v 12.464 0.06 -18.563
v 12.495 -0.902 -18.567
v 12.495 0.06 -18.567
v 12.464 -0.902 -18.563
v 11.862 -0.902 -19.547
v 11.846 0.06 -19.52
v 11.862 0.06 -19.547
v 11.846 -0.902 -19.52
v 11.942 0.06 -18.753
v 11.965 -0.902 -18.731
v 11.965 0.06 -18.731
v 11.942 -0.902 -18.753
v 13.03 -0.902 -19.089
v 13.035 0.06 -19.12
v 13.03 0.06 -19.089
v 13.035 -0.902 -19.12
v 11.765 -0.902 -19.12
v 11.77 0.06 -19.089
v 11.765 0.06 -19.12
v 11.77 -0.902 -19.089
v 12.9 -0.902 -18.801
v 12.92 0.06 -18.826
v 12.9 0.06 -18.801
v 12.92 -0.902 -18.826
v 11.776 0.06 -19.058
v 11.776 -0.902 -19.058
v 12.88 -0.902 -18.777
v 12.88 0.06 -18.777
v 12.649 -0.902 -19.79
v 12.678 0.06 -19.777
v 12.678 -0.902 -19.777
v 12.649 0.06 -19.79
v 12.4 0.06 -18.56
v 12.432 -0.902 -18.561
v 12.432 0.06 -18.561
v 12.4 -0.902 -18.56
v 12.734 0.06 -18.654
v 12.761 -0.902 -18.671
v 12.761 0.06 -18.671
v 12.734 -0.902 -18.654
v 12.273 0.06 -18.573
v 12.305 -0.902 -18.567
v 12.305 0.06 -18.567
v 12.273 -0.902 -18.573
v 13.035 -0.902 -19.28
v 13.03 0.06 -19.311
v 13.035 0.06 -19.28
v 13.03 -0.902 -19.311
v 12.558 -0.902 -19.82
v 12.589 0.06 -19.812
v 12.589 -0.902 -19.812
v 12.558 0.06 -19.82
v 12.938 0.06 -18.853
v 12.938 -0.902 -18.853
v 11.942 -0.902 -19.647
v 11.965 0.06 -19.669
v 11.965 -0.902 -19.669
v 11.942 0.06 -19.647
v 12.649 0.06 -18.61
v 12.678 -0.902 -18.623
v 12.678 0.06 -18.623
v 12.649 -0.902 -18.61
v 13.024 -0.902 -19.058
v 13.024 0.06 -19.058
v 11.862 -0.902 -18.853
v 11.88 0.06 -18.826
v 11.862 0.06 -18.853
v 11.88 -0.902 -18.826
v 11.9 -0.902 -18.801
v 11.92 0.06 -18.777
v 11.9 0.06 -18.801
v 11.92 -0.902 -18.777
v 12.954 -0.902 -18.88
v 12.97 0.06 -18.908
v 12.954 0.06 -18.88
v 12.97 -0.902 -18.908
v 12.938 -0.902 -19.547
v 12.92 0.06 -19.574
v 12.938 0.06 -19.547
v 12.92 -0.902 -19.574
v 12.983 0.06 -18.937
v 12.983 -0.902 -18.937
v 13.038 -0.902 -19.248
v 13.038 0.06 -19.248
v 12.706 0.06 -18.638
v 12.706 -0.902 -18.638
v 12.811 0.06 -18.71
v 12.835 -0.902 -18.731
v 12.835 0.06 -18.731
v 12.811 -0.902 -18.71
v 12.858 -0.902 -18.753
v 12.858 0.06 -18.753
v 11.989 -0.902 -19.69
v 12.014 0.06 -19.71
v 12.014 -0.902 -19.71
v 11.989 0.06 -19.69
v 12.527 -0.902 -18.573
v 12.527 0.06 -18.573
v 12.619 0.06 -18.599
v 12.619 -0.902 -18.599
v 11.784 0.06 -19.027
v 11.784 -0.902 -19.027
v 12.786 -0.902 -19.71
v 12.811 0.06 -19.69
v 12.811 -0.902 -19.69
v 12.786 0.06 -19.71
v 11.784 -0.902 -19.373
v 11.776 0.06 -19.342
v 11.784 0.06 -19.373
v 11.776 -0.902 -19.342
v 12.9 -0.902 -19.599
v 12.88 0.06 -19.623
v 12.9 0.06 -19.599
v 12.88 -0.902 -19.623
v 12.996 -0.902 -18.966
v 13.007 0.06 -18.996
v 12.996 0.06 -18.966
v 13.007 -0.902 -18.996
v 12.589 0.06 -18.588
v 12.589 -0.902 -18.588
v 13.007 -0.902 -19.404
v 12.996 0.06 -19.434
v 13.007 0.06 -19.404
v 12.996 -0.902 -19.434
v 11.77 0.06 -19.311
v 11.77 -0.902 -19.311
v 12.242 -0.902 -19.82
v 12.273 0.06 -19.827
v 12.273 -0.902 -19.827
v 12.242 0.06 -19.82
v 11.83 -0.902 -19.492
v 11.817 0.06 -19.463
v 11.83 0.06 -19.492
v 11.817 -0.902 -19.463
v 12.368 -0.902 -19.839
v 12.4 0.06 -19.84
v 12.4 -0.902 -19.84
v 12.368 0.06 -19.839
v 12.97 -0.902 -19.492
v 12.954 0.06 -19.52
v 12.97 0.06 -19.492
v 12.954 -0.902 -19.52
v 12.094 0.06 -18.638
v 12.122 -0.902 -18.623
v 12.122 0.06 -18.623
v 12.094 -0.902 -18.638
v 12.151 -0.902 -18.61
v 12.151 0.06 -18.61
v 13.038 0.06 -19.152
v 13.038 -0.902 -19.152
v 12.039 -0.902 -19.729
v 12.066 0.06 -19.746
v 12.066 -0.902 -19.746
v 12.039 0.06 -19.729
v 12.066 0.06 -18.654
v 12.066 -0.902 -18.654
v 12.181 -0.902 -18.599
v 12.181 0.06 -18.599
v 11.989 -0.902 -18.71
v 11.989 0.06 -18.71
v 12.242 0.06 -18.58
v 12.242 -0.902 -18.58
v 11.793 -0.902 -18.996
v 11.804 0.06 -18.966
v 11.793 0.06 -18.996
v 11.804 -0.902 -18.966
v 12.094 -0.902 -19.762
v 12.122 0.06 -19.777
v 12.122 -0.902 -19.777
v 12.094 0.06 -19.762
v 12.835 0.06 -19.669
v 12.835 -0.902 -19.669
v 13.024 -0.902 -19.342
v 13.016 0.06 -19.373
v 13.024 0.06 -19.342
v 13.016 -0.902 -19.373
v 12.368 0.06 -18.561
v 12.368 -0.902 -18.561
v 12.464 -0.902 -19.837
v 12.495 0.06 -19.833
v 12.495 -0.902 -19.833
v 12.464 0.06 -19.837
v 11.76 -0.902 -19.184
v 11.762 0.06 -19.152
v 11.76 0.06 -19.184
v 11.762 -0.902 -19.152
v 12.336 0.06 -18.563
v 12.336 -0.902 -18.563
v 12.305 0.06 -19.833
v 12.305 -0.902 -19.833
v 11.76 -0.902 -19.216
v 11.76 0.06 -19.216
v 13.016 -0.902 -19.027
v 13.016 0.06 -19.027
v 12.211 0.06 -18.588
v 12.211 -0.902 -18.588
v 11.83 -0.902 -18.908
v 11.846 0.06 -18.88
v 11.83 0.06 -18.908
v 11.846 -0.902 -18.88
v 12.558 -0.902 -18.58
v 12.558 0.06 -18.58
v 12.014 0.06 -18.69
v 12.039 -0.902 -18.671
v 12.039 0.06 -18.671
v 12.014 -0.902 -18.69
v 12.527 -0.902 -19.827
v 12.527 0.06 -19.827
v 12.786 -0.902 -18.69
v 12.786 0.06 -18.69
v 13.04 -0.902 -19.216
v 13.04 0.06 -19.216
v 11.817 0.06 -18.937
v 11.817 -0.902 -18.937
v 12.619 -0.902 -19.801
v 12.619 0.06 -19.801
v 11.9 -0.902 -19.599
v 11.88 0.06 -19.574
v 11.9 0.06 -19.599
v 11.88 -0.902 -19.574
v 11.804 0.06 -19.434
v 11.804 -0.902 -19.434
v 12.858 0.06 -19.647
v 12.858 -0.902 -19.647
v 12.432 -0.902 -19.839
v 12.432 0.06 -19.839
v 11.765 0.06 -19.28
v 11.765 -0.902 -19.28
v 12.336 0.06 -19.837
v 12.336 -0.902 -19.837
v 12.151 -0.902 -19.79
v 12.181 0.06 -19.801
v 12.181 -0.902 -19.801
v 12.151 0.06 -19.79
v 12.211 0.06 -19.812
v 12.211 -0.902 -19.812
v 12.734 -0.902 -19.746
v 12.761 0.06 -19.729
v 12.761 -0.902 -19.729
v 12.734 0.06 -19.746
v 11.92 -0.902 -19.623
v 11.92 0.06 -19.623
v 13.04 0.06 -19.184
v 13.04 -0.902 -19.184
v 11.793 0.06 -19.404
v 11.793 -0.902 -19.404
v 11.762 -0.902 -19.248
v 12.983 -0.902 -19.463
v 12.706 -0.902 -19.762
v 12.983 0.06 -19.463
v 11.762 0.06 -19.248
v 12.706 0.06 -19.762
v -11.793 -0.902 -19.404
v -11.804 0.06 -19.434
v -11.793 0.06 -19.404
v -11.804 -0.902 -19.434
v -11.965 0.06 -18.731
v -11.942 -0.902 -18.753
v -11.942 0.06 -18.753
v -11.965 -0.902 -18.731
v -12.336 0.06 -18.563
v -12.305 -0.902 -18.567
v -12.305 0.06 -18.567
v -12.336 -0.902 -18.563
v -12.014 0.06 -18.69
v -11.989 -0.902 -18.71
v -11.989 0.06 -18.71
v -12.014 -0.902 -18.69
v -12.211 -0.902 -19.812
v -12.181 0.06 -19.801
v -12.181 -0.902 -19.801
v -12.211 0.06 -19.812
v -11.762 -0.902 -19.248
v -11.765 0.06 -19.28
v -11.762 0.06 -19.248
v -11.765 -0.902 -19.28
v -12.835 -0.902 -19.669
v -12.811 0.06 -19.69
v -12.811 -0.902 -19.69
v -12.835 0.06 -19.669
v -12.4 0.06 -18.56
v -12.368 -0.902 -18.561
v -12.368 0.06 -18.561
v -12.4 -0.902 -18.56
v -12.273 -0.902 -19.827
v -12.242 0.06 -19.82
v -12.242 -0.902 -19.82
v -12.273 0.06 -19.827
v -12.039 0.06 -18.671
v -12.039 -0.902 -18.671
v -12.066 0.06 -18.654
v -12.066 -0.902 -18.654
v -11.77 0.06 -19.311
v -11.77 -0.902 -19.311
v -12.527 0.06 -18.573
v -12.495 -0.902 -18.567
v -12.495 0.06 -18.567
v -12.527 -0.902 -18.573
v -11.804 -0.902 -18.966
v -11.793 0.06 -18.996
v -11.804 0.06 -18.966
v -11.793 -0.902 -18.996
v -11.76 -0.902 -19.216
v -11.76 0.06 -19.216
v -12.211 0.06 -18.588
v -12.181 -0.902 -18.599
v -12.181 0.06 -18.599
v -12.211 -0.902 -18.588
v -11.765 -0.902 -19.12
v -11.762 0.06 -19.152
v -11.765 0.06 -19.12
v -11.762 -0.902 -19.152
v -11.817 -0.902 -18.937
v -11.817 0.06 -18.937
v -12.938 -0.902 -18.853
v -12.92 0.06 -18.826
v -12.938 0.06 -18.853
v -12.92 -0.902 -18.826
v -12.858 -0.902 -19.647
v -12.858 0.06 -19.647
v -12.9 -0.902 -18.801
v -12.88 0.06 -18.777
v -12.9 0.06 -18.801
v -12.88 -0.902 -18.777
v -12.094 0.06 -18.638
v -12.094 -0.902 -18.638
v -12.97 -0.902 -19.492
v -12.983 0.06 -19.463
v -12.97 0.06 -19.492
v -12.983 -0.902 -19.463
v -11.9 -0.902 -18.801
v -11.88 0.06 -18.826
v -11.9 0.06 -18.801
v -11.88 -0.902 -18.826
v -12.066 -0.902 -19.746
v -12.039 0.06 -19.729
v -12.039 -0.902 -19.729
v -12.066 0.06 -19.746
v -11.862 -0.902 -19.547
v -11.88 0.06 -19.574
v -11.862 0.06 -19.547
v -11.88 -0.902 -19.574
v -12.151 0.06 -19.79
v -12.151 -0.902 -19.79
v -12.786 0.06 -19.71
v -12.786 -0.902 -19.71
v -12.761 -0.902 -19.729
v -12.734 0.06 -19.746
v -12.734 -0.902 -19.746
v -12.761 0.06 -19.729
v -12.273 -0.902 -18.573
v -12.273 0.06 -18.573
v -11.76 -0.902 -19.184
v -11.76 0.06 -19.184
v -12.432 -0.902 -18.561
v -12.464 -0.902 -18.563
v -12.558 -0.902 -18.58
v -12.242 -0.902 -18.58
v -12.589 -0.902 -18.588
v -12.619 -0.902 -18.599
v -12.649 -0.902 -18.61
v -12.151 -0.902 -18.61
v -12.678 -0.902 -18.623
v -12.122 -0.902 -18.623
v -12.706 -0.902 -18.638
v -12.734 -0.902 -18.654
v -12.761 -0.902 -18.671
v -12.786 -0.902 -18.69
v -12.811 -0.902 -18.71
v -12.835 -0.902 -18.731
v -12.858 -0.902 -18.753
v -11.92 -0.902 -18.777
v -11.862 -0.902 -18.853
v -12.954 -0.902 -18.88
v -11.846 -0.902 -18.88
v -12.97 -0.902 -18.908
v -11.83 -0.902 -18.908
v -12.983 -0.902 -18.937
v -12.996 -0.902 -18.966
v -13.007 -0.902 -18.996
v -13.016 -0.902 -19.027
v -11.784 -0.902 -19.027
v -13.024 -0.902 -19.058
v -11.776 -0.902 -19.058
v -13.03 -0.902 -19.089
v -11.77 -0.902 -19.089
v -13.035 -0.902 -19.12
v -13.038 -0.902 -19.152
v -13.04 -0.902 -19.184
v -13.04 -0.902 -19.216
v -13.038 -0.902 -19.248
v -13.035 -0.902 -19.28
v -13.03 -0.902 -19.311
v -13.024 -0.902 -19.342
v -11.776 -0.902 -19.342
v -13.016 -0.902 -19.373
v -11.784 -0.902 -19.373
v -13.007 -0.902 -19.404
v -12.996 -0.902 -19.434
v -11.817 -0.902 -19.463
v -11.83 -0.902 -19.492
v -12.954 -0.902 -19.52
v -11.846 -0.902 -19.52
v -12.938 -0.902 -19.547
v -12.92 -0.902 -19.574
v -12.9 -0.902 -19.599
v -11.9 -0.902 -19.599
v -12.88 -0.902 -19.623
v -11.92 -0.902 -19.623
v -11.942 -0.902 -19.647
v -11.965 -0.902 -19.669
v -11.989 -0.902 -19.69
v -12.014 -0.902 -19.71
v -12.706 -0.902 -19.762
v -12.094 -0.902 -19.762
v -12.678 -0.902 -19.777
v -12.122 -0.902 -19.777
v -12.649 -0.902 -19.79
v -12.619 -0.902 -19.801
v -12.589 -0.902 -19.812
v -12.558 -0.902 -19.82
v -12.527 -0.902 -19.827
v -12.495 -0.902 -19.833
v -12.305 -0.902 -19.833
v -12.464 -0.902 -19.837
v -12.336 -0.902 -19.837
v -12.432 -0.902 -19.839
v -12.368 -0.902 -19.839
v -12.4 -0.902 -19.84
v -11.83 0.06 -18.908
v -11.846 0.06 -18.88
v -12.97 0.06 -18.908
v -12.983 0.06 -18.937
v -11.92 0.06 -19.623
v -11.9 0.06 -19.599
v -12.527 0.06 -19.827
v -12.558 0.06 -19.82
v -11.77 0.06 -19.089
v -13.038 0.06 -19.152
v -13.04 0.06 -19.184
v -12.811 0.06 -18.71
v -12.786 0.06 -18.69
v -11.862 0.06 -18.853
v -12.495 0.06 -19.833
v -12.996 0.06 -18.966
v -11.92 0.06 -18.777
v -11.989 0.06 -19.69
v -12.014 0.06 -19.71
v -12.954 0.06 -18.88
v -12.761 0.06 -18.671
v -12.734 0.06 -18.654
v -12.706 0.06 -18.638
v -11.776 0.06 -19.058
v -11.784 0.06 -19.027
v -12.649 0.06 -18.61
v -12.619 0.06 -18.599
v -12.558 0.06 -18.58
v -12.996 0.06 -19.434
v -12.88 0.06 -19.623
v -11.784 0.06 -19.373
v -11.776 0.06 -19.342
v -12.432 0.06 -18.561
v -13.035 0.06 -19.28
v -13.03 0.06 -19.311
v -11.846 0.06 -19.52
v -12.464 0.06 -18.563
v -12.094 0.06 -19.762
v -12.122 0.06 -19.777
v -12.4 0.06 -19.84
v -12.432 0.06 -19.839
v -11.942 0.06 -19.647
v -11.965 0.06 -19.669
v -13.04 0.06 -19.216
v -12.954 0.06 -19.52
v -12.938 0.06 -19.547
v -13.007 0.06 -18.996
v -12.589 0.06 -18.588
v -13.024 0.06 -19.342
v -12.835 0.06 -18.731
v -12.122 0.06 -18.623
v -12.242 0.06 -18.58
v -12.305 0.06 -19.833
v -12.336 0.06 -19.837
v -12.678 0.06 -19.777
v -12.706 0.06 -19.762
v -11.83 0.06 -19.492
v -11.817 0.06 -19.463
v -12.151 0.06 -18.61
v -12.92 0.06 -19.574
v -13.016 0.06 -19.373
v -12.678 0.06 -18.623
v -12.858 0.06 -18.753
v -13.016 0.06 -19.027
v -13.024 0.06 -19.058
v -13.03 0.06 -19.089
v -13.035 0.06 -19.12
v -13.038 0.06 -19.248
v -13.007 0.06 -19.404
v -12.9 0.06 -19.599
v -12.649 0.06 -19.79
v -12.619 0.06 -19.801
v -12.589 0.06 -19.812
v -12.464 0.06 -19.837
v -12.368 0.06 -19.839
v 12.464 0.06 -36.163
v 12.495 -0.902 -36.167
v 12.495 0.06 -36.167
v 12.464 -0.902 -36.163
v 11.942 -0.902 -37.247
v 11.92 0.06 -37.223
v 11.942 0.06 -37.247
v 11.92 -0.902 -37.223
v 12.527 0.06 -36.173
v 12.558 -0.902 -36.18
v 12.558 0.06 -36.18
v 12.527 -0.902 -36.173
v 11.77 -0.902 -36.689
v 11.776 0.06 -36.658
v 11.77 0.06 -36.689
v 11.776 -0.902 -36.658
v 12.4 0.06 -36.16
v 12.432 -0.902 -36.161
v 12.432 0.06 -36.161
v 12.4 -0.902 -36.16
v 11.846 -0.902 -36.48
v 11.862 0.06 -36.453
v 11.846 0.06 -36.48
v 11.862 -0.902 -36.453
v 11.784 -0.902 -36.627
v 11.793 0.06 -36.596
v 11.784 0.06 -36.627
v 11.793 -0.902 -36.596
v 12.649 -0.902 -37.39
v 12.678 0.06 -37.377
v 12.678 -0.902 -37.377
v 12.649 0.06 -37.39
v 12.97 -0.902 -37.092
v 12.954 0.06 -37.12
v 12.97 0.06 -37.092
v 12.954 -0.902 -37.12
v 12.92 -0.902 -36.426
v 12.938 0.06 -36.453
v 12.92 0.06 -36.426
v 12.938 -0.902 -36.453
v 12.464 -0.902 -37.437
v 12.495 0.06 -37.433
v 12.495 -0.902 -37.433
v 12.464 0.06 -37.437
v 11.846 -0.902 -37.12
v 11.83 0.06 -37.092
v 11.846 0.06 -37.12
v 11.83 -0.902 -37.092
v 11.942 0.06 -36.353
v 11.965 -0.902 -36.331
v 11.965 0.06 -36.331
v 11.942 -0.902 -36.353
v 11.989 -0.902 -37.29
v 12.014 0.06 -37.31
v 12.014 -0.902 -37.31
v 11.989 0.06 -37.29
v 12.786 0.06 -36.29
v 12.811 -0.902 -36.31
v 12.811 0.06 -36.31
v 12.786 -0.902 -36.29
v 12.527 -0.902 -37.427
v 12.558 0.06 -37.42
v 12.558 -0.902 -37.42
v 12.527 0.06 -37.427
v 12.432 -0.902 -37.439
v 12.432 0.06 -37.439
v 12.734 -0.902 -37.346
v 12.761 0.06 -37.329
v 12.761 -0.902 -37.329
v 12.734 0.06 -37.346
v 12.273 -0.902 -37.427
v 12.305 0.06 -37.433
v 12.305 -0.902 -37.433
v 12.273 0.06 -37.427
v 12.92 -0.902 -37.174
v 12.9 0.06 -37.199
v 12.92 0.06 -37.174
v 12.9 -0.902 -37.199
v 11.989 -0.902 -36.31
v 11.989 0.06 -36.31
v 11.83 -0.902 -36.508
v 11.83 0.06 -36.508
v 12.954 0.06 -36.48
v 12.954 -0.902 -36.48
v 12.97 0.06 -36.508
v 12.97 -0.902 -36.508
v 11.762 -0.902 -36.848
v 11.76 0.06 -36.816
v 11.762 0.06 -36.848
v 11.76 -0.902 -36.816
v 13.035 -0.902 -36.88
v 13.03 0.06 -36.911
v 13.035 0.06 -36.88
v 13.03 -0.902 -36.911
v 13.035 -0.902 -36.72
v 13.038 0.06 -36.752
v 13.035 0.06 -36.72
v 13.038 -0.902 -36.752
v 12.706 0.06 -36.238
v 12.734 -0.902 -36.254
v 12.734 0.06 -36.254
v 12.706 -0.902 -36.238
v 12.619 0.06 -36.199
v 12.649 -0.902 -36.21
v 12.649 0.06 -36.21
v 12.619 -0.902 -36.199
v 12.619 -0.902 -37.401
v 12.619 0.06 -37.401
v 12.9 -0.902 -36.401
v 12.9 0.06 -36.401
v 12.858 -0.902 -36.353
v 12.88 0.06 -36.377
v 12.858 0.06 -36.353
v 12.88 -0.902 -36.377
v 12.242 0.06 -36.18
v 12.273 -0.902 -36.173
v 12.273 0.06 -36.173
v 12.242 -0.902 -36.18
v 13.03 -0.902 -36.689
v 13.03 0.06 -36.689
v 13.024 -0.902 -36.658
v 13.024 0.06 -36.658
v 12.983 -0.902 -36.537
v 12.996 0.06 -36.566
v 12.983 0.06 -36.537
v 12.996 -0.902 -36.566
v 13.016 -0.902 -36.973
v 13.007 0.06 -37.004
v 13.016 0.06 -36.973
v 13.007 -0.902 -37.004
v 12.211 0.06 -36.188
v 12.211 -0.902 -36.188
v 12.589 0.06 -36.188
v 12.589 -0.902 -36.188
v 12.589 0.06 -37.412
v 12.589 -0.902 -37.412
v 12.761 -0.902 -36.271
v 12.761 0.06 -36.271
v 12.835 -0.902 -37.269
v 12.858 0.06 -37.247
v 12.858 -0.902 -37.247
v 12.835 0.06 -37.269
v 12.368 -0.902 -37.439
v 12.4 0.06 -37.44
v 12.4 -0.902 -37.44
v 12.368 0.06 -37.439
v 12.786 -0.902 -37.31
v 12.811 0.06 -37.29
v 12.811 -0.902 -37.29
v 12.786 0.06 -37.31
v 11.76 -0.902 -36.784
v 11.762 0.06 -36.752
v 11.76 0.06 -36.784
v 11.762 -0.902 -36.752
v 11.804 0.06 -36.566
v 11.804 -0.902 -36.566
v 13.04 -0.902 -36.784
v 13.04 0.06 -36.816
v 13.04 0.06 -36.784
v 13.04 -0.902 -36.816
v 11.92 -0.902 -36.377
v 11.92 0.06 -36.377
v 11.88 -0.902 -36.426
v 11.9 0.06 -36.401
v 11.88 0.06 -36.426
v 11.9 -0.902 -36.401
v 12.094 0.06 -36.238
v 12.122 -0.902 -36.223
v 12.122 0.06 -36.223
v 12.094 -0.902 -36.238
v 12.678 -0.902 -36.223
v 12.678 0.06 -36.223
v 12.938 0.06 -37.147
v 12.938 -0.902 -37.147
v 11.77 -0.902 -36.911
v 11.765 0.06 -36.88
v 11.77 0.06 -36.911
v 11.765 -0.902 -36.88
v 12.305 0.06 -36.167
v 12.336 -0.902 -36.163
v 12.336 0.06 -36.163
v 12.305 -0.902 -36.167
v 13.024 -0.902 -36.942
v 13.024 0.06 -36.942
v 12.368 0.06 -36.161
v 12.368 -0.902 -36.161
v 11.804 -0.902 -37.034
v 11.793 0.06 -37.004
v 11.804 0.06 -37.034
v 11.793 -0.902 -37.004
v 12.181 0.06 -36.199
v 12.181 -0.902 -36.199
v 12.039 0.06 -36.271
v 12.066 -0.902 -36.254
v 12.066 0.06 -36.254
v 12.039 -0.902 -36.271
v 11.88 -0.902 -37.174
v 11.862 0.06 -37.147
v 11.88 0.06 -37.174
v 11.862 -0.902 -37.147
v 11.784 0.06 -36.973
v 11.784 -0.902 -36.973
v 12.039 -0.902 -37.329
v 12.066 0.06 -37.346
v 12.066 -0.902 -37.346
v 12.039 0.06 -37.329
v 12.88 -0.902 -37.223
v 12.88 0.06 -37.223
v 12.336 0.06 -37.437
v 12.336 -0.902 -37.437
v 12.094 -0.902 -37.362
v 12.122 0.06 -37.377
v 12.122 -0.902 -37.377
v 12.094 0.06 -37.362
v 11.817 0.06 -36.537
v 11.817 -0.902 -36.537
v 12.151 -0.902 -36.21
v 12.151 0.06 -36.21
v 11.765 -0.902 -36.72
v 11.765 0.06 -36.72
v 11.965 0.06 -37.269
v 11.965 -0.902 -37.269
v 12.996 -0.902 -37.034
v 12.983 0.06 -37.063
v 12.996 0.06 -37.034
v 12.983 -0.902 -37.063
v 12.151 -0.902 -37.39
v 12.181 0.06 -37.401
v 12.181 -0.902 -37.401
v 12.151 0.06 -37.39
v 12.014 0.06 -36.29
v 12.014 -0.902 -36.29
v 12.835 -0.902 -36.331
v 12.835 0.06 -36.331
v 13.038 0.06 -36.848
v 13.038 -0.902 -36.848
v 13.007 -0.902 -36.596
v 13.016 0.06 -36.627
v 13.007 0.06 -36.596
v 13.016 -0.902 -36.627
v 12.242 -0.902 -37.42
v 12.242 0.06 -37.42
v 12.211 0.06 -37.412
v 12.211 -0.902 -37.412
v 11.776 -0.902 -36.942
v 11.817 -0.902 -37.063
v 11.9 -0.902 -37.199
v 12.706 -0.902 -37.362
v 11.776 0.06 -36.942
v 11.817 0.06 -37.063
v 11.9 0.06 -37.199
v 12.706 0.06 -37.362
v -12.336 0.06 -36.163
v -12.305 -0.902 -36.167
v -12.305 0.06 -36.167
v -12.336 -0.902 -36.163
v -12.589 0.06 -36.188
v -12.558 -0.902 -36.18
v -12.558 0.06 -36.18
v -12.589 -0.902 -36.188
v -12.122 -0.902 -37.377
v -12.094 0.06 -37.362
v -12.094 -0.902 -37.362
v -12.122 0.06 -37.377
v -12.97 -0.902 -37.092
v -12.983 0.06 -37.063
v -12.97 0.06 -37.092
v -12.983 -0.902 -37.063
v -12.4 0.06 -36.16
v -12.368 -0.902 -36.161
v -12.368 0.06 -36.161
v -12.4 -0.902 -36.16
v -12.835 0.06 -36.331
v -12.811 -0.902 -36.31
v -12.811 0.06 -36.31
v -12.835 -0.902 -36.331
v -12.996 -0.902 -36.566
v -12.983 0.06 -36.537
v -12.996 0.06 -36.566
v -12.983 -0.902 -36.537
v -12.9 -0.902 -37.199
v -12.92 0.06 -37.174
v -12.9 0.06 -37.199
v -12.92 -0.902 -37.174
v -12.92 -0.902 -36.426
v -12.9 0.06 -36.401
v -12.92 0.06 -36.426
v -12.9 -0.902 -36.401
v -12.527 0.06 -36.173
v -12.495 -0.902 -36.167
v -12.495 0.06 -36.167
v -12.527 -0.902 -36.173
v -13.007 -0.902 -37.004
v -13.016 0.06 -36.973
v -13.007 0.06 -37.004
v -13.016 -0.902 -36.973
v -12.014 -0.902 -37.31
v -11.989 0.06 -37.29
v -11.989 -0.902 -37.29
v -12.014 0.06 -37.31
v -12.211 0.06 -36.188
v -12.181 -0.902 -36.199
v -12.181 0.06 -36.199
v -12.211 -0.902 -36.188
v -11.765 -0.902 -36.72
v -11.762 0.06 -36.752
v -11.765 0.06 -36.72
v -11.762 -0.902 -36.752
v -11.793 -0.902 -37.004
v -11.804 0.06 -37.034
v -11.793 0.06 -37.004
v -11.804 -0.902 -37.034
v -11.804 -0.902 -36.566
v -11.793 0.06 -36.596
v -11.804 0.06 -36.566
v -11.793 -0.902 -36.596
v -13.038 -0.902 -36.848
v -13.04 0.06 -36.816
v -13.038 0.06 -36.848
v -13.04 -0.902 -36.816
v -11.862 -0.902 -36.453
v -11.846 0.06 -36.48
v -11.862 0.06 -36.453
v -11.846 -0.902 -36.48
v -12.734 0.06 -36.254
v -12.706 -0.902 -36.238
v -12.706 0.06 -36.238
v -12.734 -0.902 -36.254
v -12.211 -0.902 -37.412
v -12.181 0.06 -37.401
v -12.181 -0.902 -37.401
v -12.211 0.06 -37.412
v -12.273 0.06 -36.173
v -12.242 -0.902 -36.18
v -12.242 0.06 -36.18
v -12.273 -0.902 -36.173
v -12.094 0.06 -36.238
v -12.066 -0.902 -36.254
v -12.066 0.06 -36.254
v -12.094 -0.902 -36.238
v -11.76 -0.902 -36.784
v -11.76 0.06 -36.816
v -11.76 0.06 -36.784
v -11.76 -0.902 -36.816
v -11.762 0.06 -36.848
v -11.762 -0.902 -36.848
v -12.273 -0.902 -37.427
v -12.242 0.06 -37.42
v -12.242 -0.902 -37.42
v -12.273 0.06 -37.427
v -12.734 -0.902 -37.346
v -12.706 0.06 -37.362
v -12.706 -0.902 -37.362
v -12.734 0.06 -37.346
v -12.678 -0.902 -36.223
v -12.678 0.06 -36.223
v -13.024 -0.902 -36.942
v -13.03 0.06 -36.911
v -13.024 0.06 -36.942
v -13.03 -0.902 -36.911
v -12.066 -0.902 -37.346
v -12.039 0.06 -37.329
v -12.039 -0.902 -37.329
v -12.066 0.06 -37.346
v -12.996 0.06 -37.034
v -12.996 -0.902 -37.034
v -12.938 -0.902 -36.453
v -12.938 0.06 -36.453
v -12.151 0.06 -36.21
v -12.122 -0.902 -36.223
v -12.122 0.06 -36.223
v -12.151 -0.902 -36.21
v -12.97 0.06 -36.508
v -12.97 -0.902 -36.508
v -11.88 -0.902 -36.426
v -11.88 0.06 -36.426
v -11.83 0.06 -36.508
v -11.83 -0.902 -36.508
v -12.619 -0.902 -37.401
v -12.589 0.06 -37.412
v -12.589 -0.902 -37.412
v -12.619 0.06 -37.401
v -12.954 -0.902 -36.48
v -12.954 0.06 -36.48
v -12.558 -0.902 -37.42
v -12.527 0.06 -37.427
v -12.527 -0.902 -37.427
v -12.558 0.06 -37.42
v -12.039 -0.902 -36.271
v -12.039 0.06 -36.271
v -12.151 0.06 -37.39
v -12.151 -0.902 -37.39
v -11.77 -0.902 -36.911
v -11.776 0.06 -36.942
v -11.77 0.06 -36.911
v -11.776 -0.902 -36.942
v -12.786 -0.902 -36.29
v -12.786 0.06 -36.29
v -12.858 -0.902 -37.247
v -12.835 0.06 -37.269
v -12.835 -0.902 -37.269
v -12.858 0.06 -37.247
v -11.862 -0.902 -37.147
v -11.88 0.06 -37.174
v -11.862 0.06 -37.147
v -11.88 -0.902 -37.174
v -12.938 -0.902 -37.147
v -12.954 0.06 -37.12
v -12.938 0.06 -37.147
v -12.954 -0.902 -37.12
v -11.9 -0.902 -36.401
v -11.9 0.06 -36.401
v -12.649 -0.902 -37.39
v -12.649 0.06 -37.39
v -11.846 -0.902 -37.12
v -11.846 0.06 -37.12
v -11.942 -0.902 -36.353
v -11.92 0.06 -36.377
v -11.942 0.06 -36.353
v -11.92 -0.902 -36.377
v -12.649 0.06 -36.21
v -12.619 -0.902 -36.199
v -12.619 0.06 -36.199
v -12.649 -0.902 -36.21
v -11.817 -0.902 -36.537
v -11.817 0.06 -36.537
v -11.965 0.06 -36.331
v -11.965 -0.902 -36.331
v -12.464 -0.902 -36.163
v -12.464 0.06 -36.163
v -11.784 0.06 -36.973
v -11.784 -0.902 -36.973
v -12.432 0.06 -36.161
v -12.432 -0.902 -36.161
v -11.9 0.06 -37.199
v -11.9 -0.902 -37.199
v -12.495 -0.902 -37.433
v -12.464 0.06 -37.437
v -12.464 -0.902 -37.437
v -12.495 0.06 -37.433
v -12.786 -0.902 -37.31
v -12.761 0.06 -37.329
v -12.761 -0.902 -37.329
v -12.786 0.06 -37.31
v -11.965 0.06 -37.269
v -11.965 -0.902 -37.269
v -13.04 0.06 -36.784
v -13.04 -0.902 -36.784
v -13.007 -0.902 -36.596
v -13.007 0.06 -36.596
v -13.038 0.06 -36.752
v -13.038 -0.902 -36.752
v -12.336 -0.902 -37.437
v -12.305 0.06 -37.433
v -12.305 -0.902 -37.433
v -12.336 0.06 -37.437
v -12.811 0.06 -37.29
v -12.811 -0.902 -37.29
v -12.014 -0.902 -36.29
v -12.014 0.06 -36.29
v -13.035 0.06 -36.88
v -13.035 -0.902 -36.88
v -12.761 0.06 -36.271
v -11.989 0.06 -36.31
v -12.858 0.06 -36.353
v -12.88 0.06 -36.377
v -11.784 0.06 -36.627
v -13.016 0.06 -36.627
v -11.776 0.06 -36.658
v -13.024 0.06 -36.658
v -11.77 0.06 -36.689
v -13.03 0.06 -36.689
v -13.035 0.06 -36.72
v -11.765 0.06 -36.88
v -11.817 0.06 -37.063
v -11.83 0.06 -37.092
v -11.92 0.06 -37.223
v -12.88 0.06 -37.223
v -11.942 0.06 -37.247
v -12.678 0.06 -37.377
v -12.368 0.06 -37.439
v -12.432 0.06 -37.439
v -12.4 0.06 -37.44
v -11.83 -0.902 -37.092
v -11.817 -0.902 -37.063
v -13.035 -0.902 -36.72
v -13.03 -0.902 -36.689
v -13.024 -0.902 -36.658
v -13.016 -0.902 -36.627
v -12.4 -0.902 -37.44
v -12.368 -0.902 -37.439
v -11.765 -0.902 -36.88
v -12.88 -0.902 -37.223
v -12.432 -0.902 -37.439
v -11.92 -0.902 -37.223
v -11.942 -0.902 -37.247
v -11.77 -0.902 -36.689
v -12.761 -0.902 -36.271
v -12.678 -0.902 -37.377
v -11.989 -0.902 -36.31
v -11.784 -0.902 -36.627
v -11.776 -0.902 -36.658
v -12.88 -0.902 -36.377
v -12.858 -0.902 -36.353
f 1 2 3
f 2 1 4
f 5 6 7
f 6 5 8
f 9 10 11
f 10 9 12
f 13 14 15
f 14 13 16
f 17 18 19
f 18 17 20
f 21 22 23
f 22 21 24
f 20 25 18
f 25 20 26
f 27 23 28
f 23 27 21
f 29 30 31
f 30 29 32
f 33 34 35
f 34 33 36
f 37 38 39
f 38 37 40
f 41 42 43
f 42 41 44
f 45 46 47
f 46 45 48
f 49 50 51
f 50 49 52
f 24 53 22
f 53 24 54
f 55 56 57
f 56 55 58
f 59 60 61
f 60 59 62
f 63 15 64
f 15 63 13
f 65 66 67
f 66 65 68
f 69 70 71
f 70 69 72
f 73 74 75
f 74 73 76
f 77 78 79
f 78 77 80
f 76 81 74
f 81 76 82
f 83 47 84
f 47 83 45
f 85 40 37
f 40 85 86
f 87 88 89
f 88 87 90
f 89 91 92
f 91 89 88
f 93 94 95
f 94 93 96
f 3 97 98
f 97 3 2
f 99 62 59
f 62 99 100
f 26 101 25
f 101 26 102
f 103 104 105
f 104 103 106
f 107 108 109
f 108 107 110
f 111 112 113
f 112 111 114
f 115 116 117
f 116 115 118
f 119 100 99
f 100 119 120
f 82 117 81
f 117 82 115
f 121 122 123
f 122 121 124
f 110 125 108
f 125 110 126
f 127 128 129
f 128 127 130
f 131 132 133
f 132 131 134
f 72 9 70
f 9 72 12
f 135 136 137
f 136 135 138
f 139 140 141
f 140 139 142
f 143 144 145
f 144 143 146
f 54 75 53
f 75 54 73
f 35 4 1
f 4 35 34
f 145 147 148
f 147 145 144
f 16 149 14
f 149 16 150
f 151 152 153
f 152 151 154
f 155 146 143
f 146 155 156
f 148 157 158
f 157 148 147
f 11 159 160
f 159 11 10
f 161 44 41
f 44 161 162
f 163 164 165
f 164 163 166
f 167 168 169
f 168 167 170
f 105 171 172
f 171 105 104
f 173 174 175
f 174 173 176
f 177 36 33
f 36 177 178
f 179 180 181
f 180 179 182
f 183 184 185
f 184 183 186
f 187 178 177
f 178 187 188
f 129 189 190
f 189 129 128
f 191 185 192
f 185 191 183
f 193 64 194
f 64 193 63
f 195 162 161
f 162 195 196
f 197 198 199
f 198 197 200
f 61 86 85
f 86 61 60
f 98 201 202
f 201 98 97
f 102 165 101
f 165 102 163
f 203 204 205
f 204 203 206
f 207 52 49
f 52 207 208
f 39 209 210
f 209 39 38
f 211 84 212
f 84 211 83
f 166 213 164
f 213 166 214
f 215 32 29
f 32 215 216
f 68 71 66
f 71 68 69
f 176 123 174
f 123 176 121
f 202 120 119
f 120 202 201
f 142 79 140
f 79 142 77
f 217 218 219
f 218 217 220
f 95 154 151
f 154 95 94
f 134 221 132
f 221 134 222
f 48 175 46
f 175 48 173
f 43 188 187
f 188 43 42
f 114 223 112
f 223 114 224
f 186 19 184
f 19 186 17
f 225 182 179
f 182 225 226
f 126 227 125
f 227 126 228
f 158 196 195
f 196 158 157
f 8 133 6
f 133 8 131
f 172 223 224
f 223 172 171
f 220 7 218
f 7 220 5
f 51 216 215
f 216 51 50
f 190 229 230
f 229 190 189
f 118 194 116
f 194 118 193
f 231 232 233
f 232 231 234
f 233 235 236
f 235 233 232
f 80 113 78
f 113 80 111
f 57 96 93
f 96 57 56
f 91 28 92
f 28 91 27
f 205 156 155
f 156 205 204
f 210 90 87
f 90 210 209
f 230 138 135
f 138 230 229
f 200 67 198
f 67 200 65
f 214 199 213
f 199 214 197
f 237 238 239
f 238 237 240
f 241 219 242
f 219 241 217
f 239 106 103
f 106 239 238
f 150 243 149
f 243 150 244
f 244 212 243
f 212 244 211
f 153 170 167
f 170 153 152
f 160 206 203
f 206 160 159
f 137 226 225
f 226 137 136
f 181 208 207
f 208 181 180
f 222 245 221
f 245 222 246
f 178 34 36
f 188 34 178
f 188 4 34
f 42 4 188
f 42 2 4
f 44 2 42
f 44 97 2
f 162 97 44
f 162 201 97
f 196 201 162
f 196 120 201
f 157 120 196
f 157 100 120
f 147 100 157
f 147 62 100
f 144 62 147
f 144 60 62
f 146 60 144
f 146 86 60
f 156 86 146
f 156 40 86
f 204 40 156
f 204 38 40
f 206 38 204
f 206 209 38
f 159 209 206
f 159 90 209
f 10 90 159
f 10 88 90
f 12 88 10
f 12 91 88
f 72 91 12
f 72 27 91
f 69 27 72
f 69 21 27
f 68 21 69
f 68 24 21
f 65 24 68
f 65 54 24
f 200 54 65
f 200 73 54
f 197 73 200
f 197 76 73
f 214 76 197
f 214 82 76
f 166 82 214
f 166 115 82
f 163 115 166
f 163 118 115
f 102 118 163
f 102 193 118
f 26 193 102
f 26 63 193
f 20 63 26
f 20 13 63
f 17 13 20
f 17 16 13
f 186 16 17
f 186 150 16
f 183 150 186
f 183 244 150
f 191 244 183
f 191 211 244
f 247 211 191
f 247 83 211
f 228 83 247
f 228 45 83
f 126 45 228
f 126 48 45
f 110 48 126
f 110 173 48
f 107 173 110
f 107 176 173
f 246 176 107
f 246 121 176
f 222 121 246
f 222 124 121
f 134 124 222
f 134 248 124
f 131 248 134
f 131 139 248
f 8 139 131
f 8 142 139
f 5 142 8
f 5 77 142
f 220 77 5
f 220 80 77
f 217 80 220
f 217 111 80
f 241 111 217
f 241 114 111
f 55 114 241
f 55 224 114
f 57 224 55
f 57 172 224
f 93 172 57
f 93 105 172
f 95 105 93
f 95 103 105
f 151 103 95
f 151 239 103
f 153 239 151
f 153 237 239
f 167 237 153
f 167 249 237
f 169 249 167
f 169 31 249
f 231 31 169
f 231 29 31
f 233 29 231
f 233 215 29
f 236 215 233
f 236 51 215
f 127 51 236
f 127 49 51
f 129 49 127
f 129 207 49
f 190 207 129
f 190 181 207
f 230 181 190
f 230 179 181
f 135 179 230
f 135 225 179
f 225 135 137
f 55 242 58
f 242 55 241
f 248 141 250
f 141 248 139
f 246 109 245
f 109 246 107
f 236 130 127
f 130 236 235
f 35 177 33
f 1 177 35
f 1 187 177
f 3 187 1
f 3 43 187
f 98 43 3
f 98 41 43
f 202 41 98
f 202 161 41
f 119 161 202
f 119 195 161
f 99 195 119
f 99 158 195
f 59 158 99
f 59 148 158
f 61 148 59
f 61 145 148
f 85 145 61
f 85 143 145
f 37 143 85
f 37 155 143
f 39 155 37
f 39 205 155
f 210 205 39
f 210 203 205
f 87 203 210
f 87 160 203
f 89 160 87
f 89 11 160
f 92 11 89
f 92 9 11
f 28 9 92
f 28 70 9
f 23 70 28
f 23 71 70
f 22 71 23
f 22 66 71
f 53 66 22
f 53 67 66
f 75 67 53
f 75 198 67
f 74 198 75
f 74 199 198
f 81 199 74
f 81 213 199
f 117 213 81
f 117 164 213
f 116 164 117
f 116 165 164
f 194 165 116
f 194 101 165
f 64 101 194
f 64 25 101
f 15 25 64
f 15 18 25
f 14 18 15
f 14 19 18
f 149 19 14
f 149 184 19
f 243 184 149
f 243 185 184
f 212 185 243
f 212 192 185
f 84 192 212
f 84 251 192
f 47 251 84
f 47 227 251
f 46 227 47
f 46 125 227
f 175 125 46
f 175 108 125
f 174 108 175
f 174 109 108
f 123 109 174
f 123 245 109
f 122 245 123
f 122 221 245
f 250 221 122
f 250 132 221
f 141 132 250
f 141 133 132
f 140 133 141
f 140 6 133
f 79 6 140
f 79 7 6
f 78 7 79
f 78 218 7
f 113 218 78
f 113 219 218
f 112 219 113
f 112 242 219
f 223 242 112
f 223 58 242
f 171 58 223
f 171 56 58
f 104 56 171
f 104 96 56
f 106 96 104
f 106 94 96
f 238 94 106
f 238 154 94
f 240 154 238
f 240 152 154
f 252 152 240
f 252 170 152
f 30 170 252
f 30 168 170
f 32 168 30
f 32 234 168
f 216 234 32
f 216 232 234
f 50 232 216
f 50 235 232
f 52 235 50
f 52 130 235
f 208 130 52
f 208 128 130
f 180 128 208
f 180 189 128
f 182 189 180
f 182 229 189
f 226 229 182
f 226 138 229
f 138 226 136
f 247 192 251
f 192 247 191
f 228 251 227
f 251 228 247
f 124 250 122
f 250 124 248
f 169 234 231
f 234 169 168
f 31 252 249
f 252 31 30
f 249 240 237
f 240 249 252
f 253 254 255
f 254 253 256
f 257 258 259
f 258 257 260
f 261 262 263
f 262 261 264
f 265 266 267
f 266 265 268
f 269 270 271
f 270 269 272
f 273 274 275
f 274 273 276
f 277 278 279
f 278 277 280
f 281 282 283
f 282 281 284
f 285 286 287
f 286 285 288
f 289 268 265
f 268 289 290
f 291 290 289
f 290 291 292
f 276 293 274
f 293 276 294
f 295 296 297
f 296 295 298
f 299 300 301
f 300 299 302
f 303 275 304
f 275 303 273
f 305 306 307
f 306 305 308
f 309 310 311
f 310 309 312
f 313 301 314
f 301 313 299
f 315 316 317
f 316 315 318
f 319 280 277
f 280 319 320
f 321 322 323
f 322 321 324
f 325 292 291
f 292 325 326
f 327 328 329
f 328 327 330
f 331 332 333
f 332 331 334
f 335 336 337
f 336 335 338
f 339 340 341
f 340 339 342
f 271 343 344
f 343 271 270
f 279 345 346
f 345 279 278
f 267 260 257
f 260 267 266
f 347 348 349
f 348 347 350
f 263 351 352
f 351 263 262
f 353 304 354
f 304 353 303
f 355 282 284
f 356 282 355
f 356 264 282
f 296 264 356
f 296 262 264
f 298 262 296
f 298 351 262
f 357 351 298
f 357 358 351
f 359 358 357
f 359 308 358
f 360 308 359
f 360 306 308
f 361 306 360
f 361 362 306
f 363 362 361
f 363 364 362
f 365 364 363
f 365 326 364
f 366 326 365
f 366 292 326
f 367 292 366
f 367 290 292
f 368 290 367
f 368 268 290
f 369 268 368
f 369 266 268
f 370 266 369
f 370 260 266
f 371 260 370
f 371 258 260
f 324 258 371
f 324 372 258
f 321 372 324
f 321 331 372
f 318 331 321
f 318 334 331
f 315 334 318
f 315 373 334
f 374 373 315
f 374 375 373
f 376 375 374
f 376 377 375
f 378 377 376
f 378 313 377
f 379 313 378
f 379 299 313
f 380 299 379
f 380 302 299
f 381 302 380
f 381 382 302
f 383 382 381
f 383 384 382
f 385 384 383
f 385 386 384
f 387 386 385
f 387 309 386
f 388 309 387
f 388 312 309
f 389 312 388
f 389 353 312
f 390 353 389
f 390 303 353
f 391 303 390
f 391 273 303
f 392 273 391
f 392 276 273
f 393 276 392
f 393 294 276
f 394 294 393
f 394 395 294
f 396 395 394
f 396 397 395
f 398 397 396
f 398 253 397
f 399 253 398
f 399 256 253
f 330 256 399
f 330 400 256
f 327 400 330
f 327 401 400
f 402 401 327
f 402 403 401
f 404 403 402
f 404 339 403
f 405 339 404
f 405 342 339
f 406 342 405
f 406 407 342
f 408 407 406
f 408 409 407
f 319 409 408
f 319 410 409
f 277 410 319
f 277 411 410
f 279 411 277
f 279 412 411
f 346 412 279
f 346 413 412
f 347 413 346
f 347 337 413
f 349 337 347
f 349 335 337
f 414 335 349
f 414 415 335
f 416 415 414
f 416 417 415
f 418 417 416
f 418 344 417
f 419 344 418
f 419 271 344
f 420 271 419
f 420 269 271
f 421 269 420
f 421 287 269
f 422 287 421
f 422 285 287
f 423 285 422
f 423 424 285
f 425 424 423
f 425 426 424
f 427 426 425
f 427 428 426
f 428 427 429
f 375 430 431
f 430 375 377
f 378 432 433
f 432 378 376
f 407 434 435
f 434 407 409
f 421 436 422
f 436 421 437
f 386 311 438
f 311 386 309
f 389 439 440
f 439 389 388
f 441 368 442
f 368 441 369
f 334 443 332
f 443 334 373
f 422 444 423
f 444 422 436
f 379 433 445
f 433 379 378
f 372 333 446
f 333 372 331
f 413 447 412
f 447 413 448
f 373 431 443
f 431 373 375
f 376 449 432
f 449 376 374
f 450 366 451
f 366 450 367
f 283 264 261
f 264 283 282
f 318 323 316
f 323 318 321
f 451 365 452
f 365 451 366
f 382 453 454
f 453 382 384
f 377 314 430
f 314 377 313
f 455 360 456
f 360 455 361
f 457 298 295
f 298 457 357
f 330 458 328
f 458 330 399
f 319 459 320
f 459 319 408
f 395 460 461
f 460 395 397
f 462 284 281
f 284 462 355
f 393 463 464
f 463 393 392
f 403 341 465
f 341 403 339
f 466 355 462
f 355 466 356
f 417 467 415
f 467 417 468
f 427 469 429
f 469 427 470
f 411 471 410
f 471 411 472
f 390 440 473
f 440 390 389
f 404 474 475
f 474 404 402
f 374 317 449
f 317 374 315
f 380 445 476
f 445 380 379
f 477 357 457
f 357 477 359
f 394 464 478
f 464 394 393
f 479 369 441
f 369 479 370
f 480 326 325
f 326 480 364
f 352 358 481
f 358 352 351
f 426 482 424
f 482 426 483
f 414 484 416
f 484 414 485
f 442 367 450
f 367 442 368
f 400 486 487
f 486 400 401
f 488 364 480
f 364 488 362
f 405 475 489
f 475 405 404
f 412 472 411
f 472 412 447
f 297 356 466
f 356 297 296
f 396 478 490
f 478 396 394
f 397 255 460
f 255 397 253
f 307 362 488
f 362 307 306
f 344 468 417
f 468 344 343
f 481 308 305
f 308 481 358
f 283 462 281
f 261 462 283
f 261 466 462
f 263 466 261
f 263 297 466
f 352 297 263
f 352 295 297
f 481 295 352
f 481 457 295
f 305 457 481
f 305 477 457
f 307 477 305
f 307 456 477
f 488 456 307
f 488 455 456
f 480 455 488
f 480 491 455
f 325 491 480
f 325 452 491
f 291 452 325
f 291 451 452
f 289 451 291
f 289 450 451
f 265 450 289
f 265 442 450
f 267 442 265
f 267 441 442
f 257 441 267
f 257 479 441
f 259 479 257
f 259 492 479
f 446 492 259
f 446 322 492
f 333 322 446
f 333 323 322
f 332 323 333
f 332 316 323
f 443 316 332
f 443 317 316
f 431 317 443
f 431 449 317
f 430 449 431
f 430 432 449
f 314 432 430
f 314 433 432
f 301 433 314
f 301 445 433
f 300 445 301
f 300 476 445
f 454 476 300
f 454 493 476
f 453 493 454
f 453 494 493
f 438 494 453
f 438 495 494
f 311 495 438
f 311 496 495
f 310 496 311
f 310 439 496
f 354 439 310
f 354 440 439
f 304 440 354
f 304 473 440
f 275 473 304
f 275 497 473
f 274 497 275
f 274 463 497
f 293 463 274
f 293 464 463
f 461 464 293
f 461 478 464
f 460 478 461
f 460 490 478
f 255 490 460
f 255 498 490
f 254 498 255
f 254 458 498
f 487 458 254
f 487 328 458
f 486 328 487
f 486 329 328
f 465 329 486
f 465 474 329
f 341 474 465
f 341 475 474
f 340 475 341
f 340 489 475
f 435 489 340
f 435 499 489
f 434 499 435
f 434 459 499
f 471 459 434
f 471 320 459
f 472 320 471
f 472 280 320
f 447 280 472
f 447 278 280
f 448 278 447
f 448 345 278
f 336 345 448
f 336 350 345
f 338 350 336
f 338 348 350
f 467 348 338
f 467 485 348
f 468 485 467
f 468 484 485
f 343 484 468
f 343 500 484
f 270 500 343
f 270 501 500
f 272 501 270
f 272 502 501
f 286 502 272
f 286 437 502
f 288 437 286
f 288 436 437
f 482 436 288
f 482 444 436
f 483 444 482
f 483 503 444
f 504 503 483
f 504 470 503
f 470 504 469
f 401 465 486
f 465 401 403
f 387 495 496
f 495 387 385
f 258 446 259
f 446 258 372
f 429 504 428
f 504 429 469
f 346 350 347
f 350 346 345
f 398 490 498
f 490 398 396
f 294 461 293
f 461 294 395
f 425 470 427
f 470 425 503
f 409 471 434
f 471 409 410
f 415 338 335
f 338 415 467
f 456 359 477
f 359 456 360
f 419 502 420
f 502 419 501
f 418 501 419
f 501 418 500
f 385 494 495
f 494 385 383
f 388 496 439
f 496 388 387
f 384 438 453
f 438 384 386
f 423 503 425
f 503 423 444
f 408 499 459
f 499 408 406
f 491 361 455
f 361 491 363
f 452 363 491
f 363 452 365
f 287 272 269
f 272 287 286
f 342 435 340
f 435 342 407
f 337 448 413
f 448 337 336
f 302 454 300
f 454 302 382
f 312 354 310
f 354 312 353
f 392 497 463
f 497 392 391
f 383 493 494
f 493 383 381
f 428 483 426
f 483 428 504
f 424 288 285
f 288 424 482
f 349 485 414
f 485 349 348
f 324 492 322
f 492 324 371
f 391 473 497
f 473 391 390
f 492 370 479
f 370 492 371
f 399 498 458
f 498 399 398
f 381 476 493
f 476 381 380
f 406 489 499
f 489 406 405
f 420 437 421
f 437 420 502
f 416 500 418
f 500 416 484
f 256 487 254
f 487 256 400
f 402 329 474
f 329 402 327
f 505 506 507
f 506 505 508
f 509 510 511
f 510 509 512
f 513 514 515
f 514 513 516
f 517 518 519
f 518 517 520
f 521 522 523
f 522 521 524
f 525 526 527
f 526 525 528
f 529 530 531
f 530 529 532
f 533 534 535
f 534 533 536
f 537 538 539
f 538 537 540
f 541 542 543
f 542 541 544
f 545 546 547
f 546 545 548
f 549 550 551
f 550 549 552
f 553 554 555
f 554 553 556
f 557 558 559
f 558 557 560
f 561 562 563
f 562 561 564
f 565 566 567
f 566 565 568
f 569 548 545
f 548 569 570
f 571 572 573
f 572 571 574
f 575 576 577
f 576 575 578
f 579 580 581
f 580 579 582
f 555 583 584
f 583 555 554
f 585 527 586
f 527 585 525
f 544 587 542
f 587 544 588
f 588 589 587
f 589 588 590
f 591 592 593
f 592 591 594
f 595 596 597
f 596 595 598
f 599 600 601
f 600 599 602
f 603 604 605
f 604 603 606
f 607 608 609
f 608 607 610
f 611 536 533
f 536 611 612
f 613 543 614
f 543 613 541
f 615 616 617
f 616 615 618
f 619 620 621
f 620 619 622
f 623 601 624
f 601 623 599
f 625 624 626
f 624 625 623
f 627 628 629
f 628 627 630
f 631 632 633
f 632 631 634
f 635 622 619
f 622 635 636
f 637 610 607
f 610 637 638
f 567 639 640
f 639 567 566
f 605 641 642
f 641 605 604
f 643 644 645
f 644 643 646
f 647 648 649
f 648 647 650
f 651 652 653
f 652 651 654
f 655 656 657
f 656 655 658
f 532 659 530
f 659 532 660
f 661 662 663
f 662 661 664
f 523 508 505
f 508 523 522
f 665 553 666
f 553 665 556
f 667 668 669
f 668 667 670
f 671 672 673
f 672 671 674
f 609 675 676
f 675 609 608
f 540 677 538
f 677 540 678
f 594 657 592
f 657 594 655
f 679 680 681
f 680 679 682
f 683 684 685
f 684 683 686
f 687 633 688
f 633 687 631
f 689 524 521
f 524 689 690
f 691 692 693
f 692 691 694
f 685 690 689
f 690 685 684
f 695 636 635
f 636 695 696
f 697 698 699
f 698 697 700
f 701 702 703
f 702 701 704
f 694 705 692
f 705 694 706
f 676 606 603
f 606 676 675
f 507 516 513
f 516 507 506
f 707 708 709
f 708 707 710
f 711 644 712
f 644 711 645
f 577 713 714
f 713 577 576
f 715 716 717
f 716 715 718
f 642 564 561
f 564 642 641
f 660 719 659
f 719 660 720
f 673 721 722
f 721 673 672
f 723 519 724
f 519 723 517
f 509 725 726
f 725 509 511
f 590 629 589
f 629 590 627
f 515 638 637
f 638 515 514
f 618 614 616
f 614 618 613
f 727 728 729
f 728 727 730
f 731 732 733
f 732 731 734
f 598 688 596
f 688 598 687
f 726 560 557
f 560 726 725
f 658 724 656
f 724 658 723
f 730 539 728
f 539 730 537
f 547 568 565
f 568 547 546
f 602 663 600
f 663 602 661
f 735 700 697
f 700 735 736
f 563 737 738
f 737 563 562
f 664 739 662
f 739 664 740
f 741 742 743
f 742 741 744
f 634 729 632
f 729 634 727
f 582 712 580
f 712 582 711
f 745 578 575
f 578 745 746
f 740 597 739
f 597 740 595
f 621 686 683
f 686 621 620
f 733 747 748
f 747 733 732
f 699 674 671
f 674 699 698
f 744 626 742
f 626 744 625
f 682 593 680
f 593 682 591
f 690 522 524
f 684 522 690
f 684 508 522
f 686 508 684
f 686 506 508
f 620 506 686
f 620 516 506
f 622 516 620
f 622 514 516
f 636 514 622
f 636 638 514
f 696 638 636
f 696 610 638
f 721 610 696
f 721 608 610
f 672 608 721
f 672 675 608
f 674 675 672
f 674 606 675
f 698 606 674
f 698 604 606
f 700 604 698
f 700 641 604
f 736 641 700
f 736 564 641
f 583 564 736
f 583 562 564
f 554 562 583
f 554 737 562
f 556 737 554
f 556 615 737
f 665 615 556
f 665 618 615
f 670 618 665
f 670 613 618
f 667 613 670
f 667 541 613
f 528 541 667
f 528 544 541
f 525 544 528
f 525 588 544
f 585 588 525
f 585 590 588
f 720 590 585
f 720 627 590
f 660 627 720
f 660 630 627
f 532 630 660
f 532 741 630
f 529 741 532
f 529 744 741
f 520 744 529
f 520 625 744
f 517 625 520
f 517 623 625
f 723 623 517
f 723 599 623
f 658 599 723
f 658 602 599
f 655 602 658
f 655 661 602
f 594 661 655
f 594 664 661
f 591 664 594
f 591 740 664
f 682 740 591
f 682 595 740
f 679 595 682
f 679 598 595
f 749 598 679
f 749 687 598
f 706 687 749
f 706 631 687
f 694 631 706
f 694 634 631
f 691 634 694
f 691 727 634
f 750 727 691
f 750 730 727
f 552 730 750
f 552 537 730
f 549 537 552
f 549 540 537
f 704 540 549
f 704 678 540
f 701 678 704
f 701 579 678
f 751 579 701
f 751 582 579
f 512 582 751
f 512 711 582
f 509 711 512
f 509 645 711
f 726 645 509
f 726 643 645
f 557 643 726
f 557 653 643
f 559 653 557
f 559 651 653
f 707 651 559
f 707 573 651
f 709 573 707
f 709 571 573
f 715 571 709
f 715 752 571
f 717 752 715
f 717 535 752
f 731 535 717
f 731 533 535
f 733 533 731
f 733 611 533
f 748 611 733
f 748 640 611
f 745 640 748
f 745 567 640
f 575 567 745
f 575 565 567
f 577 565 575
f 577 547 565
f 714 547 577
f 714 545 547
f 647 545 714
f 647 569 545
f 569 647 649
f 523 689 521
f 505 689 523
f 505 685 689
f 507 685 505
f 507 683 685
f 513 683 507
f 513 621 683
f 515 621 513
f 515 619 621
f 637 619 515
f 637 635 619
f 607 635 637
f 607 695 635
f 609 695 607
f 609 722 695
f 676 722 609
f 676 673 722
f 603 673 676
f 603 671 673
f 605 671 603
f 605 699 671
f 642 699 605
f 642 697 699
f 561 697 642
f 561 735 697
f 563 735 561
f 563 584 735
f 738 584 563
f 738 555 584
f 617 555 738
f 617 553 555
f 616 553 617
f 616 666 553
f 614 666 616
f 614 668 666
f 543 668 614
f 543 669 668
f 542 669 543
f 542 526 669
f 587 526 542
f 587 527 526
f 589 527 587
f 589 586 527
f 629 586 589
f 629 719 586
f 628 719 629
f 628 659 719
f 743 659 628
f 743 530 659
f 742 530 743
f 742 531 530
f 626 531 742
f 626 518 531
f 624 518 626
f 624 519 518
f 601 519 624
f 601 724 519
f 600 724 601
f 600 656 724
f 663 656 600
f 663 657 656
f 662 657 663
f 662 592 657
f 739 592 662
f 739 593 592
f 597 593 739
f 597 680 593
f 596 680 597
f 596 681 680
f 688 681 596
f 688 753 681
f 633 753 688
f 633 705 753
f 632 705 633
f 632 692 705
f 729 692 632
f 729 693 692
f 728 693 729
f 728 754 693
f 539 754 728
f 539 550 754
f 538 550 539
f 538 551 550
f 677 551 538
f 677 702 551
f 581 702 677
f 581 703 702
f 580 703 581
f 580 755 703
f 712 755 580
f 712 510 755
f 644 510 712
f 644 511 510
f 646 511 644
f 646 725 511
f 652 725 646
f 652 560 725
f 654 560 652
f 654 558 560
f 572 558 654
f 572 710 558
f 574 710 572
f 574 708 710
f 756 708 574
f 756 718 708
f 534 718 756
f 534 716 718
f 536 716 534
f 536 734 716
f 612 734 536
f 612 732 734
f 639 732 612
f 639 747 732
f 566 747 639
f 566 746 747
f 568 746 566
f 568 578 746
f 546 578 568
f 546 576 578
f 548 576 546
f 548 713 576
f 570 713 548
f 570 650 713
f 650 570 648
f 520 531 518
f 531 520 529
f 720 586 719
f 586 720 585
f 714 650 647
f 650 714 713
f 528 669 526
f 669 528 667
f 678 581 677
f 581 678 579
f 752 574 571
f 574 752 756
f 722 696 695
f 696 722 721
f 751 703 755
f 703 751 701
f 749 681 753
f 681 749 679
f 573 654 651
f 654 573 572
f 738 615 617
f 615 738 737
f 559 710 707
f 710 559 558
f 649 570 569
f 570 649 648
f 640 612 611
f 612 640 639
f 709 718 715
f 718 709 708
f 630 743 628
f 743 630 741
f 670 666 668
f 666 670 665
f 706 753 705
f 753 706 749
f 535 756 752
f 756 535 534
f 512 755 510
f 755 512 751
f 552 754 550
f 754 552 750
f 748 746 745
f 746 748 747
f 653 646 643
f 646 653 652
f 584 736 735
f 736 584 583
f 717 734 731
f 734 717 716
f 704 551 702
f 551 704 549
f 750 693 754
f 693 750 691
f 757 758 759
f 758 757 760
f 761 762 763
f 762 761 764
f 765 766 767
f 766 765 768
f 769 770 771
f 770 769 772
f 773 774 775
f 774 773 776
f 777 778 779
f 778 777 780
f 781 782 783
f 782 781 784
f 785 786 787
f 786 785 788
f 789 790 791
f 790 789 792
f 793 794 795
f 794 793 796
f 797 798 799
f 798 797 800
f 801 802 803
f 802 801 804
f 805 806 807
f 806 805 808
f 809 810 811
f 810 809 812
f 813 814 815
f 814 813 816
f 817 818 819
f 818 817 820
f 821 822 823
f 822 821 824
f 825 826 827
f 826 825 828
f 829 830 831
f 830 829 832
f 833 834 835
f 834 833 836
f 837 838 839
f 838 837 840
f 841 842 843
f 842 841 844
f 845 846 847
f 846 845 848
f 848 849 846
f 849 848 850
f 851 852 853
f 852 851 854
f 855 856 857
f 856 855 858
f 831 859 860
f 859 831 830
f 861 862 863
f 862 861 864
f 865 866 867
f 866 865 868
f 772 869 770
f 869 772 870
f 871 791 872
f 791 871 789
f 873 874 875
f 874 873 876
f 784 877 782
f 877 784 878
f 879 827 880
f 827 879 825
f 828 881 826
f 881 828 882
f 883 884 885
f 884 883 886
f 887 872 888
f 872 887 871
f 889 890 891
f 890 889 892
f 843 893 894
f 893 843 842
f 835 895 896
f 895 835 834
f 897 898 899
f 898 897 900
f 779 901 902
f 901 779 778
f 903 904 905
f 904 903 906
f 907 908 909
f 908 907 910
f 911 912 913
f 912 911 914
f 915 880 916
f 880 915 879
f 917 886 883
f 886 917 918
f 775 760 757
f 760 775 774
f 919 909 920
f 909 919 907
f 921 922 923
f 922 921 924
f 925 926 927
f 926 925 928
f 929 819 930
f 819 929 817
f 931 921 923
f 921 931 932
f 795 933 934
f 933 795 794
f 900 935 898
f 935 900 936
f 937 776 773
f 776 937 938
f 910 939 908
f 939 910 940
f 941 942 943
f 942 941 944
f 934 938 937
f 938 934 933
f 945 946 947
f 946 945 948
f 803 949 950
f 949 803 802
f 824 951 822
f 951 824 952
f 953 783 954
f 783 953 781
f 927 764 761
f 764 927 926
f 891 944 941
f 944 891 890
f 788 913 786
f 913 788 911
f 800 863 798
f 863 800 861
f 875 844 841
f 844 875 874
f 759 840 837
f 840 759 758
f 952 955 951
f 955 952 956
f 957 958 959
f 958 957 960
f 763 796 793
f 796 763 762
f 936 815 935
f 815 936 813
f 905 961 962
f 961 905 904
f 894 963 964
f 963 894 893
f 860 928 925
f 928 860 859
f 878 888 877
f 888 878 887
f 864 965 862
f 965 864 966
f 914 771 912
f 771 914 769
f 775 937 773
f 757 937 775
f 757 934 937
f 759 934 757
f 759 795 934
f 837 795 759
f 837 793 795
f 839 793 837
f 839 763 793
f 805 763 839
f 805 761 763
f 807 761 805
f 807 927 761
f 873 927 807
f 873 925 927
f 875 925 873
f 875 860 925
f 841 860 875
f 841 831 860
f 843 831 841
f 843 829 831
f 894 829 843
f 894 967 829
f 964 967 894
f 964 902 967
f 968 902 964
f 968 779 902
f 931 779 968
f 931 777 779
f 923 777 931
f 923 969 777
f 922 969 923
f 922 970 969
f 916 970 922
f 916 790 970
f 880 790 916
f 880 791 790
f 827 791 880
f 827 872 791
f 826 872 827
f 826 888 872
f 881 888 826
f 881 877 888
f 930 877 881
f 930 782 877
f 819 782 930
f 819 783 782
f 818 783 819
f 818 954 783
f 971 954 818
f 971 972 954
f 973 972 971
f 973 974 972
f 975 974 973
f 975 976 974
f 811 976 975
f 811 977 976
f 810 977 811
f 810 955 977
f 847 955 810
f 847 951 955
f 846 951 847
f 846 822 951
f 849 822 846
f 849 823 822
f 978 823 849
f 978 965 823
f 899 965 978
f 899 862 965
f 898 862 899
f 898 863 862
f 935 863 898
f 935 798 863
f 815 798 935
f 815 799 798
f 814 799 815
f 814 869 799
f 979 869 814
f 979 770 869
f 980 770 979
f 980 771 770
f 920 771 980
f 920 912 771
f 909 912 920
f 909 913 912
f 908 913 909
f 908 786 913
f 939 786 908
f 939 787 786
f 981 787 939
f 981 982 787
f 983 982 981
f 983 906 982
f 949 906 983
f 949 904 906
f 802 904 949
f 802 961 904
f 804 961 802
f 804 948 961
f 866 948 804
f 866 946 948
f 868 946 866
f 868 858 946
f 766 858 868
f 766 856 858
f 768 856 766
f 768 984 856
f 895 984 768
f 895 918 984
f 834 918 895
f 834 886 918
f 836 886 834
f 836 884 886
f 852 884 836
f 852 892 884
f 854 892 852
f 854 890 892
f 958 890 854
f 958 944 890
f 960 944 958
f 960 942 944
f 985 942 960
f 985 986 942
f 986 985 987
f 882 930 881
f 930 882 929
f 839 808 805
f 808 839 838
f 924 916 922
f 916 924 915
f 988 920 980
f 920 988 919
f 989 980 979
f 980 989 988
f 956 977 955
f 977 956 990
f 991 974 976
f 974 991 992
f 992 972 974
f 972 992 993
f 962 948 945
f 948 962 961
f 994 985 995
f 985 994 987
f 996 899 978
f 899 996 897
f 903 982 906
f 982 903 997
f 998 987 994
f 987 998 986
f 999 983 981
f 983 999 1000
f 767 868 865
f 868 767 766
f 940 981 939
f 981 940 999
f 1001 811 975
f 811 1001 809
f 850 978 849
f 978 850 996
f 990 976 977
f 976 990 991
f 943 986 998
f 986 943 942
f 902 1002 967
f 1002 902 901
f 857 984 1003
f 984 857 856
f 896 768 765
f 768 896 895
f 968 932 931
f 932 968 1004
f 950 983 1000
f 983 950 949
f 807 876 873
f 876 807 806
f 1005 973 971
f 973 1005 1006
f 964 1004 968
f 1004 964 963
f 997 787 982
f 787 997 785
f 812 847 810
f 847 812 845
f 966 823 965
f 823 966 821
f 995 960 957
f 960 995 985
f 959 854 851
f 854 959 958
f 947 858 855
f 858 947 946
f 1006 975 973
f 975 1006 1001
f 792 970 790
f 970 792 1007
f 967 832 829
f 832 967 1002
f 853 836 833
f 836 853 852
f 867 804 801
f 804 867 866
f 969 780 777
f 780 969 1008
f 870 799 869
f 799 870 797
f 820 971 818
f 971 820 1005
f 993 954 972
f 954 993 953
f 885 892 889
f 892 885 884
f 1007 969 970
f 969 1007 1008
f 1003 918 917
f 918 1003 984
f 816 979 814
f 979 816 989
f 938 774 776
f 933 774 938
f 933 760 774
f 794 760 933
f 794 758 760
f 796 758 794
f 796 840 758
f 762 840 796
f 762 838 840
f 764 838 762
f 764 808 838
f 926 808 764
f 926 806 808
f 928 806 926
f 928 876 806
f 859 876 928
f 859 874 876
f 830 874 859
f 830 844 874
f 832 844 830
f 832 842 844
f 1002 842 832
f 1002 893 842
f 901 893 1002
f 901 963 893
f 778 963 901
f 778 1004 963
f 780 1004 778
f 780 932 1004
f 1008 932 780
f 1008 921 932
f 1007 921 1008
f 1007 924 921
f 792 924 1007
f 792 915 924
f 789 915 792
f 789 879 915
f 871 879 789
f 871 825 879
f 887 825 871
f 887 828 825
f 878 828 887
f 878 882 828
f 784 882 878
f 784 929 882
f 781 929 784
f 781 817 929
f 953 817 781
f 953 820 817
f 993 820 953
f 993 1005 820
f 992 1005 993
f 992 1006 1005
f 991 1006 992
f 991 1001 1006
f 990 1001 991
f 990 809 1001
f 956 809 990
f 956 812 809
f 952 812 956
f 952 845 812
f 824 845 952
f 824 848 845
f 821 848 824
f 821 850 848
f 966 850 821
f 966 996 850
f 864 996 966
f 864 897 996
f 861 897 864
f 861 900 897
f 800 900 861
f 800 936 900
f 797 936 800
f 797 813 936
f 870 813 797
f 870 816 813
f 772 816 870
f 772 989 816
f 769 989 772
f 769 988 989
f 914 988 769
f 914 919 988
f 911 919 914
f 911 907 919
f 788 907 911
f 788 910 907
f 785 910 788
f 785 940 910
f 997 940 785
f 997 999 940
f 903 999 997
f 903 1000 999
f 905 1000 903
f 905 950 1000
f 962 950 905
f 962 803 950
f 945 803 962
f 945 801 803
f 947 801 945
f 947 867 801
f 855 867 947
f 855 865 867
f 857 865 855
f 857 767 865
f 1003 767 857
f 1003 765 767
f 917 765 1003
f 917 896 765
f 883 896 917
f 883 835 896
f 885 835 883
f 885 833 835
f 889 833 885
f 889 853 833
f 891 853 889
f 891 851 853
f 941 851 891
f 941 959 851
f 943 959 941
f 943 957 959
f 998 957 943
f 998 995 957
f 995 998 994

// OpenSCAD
use <../lib.scad>
use <30186.scad>
$fa=1; $fs=0.2;
function ldraw_lib__301(realsolid=false) = [
// 0 ~Moved to 30186
// 0 Name: 301.dat
// 0 Author: [PTadmin]
// 0 !LDRAW_ORG Part UPDATE 2010-01
// 0 !LICENSE Licensed under CC BY 4.0 : see CAreadme.txt
// 
// 0 BFC CERTIFY CCW
  [0,"BFC","CERTIFY"],
  [0,"BFC","CCW"],
// 
// 0 !HISTORY 2010-04-05 [PTadmin] Official Update 2010-01
// 
// 
// 0 // Glass for Window Bay 3 x 8 x 6
// 1 16 0 0 0 1 0 0 0 1 0 0 0 1 30186.dat
  [1,16,0,0,0,1,0,0,0,1,0,0,0,1, ldraw_lib__30186(realsolid)],
];
module ldraw_lib__301(step=0, col=false, unit=2/5, alt=false, line=0.2, solid=!$preview)
    makepoly(ldraw_lib__301(solid), step=step, col=col, unit=unit, alt=alt, line=line, solid=solid);
ldraw_lib__301(line=0.2);
